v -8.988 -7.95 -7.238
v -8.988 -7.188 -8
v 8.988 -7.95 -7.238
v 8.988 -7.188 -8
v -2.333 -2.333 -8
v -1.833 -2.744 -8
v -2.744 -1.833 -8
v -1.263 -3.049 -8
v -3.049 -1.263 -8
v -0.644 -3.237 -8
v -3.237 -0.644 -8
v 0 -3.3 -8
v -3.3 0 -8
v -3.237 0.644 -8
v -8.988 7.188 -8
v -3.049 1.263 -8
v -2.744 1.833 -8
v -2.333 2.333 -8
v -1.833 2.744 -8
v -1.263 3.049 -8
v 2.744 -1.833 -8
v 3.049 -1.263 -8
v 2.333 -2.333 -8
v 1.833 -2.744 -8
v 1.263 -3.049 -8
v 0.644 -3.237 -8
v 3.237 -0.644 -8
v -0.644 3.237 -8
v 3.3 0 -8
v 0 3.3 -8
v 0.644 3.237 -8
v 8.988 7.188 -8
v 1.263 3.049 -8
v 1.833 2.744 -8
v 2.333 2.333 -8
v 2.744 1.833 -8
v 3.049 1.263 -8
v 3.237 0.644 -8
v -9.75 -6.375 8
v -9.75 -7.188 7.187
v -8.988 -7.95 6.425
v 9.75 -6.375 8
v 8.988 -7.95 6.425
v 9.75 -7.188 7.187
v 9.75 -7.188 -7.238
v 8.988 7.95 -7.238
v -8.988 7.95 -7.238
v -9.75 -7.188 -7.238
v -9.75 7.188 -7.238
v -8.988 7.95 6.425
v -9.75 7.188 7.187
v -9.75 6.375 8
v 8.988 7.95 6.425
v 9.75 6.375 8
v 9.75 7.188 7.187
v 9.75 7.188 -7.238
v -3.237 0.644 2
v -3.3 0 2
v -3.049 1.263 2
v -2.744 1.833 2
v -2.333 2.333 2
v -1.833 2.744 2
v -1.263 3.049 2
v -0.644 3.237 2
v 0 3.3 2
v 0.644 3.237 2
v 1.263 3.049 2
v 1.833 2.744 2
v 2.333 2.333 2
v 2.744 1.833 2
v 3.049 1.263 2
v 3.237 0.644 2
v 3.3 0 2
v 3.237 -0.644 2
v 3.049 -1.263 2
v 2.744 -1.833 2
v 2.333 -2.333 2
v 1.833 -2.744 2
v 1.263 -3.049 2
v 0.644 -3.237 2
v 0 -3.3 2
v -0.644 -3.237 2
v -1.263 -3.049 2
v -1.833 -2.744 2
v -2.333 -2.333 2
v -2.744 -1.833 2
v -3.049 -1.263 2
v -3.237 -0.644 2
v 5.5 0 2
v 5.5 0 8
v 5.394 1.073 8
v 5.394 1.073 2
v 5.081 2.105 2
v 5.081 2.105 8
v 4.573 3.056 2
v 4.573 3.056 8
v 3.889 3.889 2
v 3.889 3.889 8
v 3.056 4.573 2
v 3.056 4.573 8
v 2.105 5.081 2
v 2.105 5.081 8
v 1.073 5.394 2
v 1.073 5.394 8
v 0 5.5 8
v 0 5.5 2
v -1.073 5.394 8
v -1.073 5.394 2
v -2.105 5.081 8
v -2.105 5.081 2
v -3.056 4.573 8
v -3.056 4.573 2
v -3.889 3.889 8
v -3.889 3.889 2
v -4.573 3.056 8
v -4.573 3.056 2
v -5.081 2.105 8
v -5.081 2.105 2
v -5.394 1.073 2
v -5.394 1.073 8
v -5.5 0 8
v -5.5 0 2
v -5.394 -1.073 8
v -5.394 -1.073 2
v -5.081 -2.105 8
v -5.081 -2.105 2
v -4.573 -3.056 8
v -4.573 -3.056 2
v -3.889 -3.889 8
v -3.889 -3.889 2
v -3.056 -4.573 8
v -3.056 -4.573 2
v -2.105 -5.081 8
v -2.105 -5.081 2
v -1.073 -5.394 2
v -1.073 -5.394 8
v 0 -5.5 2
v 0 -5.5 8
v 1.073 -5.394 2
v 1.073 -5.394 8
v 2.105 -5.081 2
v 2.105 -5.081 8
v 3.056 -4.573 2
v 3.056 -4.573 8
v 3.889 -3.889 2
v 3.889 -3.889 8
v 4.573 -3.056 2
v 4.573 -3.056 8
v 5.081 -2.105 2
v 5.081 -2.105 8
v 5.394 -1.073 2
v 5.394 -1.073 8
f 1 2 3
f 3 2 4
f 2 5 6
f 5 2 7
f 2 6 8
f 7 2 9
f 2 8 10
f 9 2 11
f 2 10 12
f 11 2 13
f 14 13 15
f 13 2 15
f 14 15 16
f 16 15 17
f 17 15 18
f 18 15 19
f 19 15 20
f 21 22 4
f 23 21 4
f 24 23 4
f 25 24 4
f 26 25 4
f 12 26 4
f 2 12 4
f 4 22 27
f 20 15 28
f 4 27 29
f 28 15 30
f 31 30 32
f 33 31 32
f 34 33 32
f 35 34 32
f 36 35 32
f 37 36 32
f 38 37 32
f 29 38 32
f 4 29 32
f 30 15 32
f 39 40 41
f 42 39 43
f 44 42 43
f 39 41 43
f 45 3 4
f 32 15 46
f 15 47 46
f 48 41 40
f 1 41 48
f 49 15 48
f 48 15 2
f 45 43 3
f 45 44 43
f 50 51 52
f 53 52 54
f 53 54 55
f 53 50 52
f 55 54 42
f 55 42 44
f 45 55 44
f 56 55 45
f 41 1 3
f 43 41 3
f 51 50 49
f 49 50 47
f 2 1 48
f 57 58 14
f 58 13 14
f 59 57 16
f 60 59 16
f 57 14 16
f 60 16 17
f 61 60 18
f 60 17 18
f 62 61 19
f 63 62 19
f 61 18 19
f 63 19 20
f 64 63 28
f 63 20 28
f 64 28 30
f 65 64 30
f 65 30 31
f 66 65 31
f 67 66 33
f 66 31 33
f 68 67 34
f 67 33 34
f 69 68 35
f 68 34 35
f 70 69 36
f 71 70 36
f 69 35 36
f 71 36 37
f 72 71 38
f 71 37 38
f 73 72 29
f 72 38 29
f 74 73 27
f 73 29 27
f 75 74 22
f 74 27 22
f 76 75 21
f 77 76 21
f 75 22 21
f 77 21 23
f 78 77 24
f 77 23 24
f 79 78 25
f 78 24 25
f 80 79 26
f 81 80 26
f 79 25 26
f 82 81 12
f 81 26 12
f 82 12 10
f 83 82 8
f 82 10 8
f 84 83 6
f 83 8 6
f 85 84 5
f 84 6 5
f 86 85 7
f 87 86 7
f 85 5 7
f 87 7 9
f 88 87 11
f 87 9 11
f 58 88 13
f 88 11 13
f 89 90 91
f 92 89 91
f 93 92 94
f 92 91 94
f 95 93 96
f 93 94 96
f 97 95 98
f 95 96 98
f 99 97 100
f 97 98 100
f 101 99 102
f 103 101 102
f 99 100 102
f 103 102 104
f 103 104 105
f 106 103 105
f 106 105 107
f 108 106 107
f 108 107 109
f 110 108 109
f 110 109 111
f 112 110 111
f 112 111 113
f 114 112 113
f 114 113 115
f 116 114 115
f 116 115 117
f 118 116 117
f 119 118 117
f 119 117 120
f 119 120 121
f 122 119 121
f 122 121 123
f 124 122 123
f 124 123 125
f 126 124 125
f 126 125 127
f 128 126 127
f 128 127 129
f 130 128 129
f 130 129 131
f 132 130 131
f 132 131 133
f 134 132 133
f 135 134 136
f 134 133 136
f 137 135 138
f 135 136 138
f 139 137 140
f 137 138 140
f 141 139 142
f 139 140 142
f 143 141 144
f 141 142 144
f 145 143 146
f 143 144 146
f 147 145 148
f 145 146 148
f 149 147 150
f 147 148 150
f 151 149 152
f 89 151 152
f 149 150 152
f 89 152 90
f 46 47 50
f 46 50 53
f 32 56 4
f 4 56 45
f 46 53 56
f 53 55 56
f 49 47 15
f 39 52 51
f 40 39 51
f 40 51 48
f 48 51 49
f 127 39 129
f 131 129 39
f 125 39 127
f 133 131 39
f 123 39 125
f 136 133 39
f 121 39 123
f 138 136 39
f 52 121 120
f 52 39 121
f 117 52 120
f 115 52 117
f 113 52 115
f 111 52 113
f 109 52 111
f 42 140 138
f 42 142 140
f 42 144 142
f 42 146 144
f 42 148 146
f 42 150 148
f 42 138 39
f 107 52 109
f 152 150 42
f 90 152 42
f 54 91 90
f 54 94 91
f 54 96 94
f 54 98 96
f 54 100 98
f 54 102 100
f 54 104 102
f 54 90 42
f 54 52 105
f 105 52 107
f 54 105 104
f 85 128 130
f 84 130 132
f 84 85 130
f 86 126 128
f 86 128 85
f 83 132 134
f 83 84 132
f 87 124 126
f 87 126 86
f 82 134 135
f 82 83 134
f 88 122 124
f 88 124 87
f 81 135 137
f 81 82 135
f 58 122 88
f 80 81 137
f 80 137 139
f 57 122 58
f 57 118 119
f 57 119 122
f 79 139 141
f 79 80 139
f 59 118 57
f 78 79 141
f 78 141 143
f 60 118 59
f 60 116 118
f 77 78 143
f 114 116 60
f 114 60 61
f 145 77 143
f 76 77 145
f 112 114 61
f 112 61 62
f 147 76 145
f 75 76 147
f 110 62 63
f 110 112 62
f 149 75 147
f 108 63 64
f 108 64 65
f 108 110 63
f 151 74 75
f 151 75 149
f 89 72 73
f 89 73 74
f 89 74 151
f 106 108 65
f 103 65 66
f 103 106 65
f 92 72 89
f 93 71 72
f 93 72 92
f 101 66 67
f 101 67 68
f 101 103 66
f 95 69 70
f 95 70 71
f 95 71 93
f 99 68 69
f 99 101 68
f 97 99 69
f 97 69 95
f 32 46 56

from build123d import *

# Parameters (mm, degrees)
SKETCH1_W                      = 19.5
SKETCH1_H                      = 16
EXTRUDE1_DEPTH                 = 7.95
CBORE_FOR_M6_SHCS1_D           = 6.6
CBORE_FOR_M6_SHCS1_CBORE_D     = 11
CBORE_FOR_M6_SHCS1_CBORE_DEPTH = 6
CHAMFER1_SIZE                  = 0.762
CHAMFER2_SIZE                  = 1.5748


with BuildPart() as part:
    # Sketch1 → Extrude1 (new, symmetric)
    with BuildSketch(Plane(origin=(0, 0, 0), x_dir=(1, 0, 0), z_dir=(0, 1, 0))):
        Rectangle(SKETCH1_W, SKETCH1_H)
    extrude(amount=EXTRUDE1_DEPTH, both=True)

    # CBORE for M6 SHCS1 (through all)
    with Locations(Plane.XY.offset(8)):
        with Locations((0, 0)):
            CounterBoreHole(CBORE_FOR_M6_SHCS1_D / 2, CBORE_FOR_M6_SHCS1_CBORE_D / 2, CBORE_FOR_M6_SHCS1_CBORE_DEPTH)

    # Chamfer1
    chamfer1_edges = [part.edges().sort_by_distance(p)[0] for p in [
        (9.75, 7.95, 0),
        (0, 7.95, -8),
        (-9.75, 7.95, 0),
        (0, -7.95, -8),
        (9.75, -7.95, 0),
        (-9.75, -7.95, 0),
        (-9.75, 0, -8),
        (9.75, 0, -8),
    ]]
    chamfer(chamfer1_edges, length=CHAMFER1_SIZE)

    # Chamfer2
    chamfer2_edges = [part.edges().sort_by_distance(p)[0] for p in [
        (0, -7.95, 8),
        (0, 7.95, 8),
    ]]
    chamfer(chamfer2_edges, length=CHAMFER2_SIZE)


solid = part.part
